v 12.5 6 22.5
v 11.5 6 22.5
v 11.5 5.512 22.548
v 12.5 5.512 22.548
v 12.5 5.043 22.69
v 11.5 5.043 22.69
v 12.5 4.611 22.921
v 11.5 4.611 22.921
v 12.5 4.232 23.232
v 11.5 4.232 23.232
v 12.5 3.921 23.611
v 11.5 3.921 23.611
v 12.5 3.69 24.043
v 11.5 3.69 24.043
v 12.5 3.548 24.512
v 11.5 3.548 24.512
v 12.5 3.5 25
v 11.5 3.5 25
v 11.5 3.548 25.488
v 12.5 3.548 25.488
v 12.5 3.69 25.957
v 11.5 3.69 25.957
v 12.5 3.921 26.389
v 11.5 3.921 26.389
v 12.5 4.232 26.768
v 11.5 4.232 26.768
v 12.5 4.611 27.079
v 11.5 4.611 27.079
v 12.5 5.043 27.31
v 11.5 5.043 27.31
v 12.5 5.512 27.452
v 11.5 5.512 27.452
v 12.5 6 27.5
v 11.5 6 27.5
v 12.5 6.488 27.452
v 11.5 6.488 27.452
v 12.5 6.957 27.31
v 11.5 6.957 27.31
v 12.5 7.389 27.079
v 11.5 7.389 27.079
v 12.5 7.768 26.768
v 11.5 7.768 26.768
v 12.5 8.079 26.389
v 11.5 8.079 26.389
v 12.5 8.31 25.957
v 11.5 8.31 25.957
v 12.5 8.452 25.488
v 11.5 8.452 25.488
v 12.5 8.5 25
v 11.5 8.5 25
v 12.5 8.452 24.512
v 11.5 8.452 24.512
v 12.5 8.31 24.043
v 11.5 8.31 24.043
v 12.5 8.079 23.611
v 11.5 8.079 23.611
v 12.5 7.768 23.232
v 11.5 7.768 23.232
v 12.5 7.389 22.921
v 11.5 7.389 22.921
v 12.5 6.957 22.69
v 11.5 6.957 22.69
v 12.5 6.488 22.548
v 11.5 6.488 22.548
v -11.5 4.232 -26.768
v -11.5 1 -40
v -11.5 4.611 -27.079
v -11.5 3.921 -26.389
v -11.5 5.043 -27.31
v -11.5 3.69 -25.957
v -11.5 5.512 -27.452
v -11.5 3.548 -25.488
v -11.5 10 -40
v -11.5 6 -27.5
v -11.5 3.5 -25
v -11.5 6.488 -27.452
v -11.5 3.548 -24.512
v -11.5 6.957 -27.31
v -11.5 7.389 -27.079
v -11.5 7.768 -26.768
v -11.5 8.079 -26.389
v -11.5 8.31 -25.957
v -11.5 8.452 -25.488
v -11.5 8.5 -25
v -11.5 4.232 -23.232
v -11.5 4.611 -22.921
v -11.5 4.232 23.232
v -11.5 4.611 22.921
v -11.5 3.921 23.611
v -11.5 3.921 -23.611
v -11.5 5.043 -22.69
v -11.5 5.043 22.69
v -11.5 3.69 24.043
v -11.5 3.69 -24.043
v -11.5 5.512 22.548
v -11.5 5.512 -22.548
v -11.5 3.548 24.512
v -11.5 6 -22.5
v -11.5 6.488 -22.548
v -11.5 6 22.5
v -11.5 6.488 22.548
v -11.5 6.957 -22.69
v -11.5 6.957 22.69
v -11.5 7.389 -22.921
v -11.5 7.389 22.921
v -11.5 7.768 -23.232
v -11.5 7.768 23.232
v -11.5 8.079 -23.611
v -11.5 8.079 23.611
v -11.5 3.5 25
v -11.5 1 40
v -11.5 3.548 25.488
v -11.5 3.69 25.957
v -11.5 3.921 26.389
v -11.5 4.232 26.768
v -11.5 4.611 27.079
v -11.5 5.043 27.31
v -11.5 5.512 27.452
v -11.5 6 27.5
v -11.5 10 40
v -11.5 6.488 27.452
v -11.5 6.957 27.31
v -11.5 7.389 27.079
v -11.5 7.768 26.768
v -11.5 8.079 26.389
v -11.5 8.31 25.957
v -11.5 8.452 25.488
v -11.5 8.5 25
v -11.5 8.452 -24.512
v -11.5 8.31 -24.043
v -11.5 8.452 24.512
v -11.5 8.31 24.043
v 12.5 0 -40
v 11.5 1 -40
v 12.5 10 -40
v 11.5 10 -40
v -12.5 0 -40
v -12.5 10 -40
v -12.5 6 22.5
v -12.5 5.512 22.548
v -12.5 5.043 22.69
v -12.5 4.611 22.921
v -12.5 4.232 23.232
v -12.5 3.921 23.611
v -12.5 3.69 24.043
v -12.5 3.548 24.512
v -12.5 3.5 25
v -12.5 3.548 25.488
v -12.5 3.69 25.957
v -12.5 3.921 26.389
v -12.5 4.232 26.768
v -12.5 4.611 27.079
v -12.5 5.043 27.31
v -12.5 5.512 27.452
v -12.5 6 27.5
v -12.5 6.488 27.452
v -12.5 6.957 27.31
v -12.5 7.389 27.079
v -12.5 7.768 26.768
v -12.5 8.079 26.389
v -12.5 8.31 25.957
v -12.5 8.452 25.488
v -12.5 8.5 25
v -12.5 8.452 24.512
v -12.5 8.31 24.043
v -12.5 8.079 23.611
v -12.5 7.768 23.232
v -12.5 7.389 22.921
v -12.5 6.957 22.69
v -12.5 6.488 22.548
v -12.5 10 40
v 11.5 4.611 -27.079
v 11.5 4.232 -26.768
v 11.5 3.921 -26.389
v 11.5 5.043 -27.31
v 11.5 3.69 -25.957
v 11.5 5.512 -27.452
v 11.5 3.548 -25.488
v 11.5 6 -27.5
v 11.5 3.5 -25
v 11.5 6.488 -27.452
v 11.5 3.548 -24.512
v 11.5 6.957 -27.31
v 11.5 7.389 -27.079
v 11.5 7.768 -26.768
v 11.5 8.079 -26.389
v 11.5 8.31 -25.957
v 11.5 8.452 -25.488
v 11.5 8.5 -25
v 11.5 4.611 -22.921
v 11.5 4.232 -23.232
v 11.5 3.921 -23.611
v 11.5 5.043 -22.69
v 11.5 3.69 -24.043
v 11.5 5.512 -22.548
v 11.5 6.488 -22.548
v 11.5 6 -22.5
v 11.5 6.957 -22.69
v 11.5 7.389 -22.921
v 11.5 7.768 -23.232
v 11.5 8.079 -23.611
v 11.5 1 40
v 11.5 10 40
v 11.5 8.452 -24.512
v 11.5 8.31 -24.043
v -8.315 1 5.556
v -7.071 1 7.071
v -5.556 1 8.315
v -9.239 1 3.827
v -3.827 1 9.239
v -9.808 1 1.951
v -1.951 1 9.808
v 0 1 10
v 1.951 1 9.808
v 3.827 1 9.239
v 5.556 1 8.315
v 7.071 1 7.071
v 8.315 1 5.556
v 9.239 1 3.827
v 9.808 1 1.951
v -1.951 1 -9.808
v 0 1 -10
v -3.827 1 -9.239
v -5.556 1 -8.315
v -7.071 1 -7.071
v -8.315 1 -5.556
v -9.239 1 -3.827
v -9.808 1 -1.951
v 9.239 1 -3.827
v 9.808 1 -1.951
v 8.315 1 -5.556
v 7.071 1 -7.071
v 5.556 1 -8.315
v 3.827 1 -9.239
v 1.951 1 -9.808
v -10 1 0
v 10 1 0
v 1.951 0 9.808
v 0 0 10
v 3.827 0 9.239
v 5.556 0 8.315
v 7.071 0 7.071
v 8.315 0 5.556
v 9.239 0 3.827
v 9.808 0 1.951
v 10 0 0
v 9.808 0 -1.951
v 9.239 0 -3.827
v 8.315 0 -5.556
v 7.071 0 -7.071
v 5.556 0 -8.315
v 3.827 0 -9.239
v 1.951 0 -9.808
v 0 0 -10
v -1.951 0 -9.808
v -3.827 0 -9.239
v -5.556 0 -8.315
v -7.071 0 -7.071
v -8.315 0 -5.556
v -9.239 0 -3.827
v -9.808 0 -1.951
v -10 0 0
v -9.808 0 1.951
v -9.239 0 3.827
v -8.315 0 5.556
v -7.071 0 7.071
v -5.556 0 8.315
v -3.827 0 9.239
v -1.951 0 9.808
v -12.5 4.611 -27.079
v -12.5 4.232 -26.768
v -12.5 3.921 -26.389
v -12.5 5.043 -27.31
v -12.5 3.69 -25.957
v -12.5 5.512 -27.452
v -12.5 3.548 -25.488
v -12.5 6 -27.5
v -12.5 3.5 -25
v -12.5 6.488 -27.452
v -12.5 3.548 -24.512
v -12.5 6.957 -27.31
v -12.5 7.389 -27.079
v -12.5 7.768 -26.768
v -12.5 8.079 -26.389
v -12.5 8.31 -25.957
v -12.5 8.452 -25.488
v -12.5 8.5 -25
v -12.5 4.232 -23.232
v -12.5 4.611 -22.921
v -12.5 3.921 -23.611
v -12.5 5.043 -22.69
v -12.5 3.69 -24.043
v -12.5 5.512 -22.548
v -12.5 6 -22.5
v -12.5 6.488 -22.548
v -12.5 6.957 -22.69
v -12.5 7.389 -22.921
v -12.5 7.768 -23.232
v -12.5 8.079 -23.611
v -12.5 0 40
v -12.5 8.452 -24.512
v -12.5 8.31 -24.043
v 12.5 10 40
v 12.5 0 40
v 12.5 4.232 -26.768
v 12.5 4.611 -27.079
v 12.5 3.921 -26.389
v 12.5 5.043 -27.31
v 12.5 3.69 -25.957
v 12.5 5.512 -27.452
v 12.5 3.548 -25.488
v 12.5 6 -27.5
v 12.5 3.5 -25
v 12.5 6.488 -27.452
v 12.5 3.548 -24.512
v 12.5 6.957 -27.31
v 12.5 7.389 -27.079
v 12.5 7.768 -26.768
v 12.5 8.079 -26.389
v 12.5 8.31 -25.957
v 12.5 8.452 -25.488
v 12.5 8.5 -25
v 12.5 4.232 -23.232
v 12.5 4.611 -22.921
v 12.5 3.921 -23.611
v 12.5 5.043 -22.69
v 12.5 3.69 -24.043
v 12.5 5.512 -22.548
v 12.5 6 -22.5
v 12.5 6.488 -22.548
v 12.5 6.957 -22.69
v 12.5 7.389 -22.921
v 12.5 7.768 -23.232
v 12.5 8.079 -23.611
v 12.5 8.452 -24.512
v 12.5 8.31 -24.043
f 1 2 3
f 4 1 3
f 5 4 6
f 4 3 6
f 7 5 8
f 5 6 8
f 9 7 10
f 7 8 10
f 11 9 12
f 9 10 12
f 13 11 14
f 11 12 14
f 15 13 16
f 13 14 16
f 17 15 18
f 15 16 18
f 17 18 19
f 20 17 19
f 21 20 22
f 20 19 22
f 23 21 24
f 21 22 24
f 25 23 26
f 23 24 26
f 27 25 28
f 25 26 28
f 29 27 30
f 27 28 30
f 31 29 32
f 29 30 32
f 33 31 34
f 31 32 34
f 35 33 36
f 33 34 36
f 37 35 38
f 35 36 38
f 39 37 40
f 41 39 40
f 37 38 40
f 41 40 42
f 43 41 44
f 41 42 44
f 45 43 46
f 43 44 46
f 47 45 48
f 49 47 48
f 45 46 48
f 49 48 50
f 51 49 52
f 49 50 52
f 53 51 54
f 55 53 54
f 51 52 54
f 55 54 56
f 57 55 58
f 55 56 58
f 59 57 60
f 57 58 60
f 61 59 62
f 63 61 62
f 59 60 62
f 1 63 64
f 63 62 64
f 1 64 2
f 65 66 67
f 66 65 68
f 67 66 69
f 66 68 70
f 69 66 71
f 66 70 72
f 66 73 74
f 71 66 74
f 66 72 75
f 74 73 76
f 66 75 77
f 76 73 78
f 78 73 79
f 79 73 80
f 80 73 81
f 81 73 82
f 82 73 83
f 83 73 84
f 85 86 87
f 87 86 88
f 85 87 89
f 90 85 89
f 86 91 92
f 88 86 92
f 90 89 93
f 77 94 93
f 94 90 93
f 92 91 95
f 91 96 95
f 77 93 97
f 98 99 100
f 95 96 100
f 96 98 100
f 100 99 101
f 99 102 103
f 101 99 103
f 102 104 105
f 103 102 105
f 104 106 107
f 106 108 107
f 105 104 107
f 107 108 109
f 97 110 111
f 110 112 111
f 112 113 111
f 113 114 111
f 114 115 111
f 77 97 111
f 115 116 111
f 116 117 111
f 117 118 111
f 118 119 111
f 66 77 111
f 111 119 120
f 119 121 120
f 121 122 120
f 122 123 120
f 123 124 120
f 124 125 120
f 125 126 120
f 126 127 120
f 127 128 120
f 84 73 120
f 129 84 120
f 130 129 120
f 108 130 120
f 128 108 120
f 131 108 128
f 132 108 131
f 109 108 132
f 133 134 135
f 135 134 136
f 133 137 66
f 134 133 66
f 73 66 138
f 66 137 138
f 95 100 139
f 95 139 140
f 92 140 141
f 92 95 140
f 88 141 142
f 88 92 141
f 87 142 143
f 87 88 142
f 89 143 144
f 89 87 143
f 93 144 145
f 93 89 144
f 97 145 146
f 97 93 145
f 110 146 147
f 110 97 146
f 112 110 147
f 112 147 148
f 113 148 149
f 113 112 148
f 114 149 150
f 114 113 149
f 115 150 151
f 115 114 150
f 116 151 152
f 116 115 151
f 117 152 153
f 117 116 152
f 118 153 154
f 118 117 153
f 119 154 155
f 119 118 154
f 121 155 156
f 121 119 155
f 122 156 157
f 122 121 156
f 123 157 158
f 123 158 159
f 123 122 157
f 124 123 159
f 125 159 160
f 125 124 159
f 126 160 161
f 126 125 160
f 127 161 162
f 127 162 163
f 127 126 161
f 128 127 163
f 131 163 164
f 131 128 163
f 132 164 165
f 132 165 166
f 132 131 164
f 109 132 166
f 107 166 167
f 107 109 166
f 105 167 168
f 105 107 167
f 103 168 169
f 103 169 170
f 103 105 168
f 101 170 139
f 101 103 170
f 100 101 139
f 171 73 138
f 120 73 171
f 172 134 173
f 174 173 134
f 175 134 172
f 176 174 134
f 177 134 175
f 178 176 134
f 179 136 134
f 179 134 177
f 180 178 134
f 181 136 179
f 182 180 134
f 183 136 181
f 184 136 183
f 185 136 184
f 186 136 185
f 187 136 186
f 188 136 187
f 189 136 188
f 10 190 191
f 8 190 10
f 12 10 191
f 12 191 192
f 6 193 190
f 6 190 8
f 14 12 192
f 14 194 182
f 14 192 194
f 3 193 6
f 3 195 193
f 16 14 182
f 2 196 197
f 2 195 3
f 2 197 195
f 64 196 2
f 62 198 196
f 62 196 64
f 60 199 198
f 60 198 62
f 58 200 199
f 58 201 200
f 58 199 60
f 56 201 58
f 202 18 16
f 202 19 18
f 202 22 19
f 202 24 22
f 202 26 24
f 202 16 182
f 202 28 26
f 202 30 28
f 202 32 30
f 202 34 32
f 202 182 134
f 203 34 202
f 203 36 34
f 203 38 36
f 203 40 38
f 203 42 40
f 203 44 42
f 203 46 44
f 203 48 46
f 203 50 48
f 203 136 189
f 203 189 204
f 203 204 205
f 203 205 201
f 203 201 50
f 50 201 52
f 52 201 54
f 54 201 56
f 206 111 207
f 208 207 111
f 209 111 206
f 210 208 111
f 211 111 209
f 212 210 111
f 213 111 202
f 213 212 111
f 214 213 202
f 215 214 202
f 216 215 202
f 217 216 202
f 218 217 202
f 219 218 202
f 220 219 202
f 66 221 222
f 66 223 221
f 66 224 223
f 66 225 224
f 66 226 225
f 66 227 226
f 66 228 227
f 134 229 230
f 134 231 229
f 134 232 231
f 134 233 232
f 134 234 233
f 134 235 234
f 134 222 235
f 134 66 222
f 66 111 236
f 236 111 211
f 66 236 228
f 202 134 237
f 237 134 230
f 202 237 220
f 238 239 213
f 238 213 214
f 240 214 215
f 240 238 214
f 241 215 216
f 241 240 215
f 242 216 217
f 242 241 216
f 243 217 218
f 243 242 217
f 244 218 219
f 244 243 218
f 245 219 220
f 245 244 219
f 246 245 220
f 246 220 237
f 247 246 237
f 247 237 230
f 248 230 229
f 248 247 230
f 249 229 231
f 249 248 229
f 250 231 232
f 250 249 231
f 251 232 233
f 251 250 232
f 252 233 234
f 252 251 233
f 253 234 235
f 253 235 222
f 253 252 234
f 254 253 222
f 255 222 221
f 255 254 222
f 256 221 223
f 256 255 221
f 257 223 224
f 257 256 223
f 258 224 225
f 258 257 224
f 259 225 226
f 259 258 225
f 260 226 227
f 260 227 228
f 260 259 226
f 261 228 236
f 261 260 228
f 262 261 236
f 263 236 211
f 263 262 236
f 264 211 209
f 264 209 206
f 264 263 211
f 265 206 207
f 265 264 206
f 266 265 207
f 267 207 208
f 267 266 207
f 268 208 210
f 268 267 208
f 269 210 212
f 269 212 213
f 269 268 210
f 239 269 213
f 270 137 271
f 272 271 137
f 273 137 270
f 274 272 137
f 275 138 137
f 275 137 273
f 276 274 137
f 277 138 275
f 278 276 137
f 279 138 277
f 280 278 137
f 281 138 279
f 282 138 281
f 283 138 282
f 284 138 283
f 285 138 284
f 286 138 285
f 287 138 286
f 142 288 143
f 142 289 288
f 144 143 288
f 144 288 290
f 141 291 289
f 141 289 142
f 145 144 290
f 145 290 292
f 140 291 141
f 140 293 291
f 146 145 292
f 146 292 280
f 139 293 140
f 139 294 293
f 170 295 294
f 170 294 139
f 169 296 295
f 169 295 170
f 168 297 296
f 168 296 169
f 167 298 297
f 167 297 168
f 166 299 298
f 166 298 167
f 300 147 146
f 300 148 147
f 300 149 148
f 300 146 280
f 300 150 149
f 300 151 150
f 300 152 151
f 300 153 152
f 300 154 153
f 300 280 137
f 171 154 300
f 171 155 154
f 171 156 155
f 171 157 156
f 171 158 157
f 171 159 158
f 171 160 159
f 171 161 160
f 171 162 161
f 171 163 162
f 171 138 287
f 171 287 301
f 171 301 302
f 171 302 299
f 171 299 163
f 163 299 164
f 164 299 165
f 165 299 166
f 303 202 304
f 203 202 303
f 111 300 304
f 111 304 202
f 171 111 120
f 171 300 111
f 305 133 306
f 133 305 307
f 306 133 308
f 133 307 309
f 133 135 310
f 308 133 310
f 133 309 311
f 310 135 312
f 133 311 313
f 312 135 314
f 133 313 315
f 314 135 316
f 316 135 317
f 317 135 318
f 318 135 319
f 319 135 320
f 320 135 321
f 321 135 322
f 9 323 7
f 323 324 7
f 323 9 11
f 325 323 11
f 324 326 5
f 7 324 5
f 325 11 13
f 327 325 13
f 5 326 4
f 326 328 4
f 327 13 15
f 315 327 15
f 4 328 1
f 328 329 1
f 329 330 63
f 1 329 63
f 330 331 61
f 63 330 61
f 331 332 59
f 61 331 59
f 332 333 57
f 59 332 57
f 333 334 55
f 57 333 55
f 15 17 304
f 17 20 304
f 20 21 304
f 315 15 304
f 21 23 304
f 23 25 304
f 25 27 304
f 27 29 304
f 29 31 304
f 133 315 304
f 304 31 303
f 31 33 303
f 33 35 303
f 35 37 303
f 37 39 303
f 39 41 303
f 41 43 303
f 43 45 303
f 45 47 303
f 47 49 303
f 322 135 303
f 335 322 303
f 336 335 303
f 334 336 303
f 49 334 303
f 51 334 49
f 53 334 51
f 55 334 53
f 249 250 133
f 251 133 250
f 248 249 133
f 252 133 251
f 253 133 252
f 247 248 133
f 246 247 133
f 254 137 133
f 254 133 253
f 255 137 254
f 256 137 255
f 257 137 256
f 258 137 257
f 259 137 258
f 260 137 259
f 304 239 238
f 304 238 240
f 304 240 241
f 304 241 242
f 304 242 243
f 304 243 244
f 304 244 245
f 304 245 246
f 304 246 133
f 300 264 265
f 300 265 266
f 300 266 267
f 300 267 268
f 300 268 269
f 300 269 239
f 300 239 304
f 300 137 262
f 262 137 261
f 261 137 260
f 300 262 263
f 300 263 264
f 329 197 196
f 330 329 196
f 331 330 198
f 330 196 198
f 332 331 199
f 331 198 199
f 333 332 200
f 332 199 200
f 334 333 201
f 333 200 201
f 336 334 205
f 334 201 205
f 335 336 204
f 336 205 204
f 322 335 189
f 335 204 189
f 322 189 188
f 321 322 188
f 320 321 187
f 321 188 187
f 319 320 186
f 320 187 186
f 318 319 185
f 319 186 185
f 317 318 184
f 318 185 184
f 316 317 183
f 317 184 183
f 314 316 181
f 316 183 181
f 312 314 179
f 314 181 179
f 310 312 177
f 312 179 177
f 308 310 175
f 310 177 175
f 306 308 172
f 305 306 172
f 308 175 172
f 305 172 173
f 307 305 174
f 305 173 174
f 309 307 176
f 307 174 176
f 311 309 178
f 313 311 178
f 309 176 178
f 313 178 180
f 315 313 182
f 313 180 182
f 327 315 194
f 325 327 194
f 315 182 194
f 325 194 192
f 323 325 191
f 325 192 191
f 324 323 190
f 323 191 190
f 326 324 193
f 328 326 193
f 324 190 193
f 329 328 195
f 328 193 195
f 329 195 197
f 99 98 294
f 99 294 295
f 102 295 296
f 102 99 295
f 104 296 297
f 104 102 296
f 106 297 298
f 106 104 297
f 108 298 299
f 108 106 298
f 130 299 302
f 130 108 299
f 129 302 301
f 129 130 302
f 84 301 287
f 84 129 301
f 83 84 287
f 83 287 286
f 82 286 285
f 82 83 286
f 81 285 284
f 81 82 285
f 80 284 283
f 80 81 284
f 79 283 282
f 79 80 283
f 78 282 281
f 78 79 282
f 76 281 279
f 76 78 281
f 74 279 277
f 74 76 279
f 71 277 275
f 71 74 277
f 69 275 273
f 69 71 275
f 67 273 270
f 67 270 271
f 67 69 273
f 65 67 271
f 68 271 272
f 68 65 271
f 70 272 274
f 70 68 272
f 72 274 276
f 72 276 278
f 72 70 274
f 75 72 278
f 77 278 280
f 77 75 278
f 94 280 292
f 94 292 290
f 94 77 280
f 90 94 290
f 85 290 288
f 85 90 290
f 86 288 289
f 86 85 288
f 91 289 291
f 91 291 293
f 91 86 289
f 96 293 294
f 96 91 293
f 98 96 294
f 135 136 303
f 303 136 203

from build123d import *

# Parameters (mm, degrees)
SKETCH2_W           = 23
SKETCH2_H           = 80
SKETCH2_R           = 10
BOSS_EXTRUDE1_DEPTH = 1
SKETCH3_W           = 80
SKETCH3_H           = 10
SKETCH3_R           = 2.5
BOSS_EXTRUDE2_DEPTH = 1


with BuildPart() as part:
    # Sketch2 → Boss-Extrude1 (new body)
    with BuildSketch(Plane(origin=(0, 0, 0), x_dir=(1, 0, 0), z_dir=(0, 1, 0))):
        Rectangle(SKETCH2_W, SKETCH2_H)
        with Locations(Location((0, 0, 0), (0, 0, 270))):
            Circle(SKETCH2_R, mode=Mode.SUBTRACT)
    extrude(amount=BOSS_EXTRUDE1_DEPTH)

    # Sketch3 → Boss-Extrude2 (add)
    with BuildSketch(Plane.ZY.offset(11.5)):
        with Locations((0, 5)):
            Rectangle(SKETCH3_W, SKETCH3_H)
        with Locations((-25, 6)):
            Circle(SKETCH3_R, mode=Mode.SUBTRACT)
        with Locations(Location((25, 6, 0), (0, 0, 180))):
            Circle(SKETCH3_R, mode=Mode.SUBTRACT)
    boss_extrude2 = extrude(amount=BOSS_EXTRUDE2_DEPTH)

    # Mirror1: Boss-Extrude2 across plane
    add(boss_extrude2.mirror(Plane(origin=(0, 0, 0), x_dir=(0, 0, 1), z_dir=(1, 0, 0))))


solid = part.part
